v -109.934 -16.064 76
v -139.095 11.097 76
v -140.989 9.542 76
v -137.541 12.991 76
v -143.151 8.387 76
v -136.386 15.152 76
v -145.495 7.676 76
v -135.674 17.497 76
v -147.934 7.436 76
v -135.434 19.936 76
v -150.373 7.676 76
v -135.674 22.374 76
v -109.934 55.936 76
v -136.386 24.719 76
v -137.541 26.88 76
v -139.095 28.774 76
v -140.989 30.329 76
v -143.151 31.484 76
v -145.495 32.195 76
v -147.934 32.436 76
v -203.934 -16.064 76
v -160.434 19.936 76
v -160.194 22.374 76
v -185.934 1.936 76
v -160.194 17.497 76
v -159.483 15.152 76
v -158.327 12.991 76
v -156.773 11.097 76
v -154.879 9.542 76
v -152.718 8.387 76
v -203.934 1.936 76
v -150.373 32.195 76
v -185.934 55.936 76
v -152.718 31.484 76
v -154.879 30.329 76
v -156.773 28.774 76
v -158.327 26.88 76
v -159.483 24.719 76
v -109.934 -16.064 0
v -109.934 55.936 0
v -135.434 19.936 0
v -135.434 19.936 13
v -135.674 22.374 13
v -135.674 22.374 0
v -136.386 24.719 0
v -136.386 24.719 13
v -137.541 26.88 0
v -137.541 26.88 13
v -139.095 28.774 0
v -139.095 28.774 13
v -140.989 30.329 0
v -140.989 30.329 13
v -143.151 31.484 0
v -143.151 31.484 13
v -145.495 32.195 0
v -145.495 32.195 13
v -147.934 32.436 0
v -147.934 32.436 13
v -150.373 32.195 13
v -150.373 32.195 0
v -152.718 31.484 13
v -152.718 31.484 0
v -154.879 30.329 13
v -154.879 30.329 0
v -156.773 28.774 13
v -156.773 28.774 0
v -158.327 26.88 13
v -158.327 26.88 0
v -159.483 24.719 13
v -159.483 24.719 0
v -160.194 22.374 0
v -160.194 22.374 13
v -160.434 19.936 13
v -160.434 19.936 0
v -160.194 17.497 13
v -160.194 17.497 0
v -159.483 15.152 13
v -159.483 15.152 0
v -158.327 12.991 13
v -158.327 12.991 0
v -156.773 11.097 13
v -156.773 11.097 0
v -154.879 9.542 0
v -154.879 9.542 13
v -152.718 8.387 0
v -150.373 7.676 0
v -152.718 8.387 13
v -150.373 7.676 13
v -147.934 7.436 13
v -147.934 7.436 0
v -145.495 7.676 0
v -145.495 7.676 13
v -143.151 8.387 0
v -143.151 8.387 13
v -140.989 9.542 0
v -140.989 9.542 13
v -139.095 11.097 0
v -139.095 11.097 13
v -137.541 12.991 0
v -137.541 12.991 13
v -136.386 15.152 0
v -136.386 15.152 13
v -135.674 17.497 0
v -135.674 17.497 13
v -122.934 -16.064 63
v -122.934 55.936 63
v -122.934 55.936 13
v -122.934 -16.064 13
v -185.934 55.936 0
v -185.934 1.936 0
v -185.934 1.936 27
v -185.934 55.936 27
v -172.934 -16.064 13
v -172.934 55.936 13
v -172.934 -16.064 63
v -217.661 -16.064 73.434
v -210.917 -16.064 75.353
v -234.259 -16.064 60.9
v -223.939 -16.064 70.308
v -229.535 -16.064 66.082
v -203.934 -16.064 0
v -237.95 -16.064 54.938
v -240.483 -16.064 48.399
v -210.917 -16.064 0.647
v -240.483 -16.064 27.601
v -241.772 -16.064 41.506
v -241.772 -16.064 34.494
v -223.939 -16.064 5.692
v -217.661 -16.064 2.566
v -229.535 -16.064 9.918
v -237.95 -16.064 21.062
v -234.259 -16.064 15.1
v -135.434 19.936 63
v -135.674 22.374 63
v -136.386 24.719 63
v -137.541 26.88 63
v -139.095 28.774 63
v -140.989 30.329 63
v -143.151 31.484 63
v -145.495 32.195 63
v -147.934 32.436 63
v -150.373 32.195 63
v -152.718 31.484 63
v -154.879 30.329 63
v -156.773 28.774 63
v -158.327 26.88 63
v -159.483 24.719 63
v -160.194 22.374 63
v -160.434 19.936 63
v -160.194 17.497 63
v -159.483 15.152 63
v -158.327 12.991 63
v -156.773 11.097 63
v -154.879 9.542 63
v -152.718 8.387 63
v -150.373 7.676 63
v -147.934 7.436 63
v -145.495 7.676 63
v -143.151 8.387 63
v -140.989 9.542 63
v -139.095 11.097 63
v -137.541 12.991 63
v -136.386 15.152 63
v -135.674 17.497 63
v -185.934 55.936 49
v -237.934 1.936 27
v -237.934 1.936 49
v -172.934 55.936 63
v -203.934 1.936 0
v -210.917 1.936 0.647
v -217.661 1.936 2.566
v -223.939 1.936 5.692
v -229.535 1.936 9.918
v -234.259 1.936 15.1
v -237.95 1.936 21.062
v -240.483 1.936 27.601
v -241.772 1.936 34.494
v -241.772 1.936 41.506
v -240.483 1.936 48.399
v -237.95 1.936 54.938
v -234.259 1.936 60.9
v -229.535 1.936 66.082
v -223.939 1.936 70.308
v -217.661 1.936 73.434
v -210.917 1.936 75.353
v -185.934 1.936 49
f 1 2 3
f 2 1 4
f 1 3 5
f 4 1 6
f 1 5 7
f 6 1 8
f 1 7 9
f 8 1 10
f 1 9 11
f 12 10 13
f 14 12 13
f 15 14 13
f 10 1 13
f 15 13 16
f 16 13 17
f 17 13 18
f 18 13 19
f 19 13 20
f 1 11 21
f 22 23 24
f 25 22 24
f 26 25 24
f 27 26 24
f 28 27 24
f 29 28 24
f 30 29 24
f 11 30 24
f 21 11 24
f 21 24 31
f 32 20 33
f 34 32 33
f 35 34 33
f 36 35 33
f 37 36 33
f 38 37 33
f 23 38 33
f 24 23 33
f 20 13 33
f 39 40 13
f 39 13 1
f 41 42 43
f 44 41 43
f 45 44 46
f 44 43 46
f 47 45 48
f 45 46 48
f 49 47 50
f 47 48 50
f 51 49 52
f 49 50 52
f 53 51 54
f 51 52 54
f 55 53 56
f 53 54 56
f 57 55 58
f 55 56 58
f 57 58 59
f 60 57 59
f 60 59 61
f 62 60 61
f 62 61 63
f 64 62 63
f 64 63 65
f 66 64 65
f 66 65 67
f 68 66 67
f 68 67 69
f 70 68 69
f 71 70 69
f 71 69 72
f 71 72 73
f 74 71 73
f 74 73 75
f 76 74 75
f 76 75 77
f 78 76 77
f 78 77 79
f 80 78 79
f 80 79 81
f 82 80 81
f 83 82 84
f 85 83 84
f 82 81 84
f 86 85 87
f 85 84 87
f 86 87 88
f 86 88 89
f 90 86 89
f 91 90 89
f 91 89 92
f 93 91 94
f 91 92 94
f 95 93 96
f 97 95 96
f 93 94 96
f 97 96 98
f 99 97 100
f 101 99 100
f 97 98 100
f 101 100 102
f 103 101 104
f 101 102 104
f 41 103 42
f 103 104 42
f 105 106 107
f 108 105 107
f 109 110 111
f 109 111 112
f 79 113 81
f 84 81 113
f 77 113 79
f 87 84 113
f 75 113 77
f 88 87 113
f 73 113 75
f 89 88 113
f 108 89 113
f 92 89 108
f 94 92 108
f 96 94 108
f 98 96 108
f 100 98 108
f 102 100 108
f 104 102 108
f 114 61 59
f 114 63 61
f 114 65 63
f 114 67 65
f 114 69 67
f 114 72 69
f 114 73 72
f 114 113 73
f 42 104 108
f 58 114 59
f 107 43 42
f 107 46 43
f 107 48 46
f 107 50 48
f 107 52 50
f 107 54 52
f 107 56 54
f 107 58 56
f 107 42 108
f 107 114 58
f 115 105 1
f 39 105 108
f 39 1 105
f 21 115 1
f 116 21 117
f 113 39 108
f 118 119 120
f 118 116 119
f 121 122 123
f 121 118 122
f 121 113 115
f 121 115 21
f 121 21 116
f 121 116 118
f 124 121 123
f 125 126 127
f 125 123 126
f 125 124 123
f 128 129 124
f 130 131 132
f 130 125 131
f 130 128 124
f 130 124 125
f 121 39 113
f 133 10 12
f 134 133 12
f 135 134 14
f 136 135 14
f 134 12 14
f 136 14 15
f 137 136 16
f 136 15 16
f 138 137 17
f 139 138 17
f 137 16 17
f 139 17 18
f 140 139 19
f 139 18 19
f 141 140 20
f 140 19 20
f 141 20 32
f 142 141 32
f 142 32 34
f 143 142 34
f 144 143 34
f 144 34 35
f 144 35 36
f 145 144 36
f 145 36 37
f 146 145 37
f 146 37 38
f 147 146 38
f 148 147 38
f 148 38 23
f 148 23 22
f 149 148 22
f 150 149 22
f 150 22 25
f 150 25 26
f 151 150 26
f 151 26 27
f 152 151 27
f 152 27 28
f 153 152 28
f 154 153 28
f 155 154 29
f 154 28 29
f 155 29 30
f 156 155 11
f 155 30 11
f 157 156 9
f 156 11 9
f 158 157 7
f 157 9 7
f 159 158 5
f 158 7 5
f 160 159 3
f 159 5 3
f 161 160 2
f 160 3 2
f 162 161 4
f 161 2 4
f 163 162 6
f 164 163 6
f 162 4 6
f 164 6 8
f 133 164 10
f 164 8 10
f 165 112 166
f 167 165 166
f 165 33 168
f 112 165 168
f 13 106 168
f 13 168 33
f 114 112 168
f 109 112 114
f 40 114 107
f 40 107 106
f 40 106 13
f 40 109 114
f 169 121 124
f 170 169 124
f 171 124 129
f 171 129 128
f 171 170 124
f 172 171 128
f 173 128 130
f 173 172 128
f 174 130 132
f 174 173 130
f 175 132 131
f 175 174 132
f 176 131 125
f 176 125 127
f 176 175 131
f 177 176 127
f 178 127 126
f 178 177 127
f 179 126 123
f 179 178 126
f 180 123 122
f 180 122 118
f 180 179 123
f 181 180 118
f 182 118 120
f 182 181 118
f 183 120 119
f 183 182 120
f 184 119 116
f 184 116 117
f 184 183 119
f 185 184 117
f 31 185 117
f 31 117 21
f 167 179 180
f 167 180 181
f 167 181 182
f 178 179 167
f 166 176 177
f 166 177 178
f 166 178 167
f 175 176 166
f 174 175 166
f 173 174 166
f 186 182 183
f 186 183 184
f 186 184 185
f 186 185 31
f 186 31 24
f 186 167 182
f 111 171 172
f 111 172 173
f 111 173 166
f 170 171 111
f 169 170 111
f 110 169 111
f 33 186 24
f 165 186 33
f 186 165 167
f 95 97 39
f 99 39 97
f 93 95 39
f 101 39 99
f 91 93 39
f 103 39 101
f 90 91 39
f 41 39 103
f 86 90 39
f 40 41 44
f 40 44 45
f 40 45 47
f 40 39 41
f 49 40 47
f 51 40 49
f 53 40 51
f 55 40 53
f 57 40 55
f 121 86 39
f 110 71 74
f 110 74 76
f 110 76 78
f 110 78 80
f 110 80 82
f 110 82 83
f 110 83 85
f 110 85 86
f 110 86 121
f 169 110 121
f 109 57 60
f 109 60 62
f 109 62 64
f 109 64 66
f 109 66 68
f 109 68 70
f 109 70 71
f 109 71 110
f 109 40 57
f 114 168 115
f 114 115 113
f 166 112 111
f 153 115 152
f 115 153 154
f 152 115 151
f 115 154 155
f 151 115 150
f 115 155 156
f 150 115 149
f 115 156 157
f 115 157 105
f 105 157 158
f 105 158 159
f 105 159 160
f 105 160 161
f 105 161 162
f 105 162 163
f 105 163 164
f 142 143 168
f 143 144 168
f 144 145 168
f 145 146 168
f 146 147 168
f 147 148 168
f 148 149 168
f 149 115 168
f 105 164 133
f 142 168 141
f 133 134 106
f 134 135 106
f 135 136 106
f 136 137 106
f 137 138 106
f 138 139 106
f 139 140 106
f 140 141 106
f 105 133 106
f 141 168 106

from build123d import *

# Parameters (mm, degrees)
Y_KSEKLIK_EKSTR_ZYON3_DEPTH = 76
IZIM9_W                     = 50
IZIM9_H                     = 50
KES_EKSTR_ZYON2_DEPTH       = 72
RADYUS2_RADIUS              = 38
RADYUS2_LENGTH              = 18
IZIM10_R                    = 12.5
KES_EKSTR_ZYON3_DEPTH       = 260.686142434
FEDER1_REACH                = 253.207
IZIM11_WALL_W               = 579.380403386
IZIM11_WALL_H               = 22


with BuildPart() as part:
    # Çizim8 → Yükseklik-Ekstrüzyon3 (new body)
    with BuildSketch(Plane.XY):
        Polygon((-185.934081036, 55.935614824), (-109.934081036, 55.935614824), (-109.934081036, -16.064385176), (-241.934081036, -16.064385176), (-241.934081036, 1.935614824), (-185.934081036, 1.935614824), align=None)
    extrude(amount=Y_KSEKLIK_EKSTR_ZYON3_DEPTH)

    # Çizim9 → Kes-Ekstrüzyon2 (cut)
    with BuildSketch(Plane(origin=(0, 55.935614824, 0), x_dir=(1, 0, 0), z_dir=(0, 1, 0))):
        with Locations((-147.934081036, -38)):
            Rectangle(IZIM9_W, IZIM9_H)
    extrude(amount=-KES_EKSTR_ZYON2_DEPTH, mode=Mode.SUBTRACT)

    # Radyus2: full round fillet: the end face becomes a half cylinder, R = half its width
    radyus2_face = Plane((-241.934081036, -7.064385176, 38), x_dir=(0, 1, 0), z_dir=(-1, 0, 0))  # on the end face: x along it, z out of the body
    radyus2_slab = radyus2_face.offset(-RADYUS2_RADIUS / 2) * Box(RADYUS2_LENGTH, 2 * RADYUS2_RADIUS, RADYUS2_RADIUS, mode=Mode.PRIVATE)  # the body's end, R deep
    radyus2_round = Plane((-203.934081036, -7.064385176, 38), x_dir=(-1, 0, 0), z_dir=(0, 1, 0)) * Cylinder(RADYUS2_RADIUS, RADYUS2_LENGTH, mode=Mode.PRIVATE)  # its axis R under the face
    add(radyus2_slab - radyus2_round, mode=Mode.SUBTRACT)

    # Çizim10 → Kes-Ekstrüzyon3 (cut, through all)
    with BuildSketch(Plane.XY.offset(76)):
        with Locations((-147.934081036, 19.935614824)):
            Circle(IZIM10_R)
    extrude(amount=-KES_EKSTR_ZYON3_DEPTH, mode=Mode.SUBTRACT)

    # Çizim11 wall → Feder1 (add, up to next)
    with BuildSketch(Plane(origin=(-211.934081036, 28.935614824, 38), x_dir=(-0.693641687066, -0.720320213491, 0), z_dir=(0.720320213491, -0.693641687066, 0)), mode=Mode.PRIVATE) as feder1_sk1:
        Rectangle(IZIM11_WALL_W, IZIM11_WALL_H)
    feder1_tool1 = extrude(feder1_sk1.sketch, amount=FEDER1_REACH, mode=Mode.PRIVATE) - part.part
    add(feder1_tool1.solids().sort_by_distance((-211.934081036, 28.935614824, 38))[0])


solid = part.part
